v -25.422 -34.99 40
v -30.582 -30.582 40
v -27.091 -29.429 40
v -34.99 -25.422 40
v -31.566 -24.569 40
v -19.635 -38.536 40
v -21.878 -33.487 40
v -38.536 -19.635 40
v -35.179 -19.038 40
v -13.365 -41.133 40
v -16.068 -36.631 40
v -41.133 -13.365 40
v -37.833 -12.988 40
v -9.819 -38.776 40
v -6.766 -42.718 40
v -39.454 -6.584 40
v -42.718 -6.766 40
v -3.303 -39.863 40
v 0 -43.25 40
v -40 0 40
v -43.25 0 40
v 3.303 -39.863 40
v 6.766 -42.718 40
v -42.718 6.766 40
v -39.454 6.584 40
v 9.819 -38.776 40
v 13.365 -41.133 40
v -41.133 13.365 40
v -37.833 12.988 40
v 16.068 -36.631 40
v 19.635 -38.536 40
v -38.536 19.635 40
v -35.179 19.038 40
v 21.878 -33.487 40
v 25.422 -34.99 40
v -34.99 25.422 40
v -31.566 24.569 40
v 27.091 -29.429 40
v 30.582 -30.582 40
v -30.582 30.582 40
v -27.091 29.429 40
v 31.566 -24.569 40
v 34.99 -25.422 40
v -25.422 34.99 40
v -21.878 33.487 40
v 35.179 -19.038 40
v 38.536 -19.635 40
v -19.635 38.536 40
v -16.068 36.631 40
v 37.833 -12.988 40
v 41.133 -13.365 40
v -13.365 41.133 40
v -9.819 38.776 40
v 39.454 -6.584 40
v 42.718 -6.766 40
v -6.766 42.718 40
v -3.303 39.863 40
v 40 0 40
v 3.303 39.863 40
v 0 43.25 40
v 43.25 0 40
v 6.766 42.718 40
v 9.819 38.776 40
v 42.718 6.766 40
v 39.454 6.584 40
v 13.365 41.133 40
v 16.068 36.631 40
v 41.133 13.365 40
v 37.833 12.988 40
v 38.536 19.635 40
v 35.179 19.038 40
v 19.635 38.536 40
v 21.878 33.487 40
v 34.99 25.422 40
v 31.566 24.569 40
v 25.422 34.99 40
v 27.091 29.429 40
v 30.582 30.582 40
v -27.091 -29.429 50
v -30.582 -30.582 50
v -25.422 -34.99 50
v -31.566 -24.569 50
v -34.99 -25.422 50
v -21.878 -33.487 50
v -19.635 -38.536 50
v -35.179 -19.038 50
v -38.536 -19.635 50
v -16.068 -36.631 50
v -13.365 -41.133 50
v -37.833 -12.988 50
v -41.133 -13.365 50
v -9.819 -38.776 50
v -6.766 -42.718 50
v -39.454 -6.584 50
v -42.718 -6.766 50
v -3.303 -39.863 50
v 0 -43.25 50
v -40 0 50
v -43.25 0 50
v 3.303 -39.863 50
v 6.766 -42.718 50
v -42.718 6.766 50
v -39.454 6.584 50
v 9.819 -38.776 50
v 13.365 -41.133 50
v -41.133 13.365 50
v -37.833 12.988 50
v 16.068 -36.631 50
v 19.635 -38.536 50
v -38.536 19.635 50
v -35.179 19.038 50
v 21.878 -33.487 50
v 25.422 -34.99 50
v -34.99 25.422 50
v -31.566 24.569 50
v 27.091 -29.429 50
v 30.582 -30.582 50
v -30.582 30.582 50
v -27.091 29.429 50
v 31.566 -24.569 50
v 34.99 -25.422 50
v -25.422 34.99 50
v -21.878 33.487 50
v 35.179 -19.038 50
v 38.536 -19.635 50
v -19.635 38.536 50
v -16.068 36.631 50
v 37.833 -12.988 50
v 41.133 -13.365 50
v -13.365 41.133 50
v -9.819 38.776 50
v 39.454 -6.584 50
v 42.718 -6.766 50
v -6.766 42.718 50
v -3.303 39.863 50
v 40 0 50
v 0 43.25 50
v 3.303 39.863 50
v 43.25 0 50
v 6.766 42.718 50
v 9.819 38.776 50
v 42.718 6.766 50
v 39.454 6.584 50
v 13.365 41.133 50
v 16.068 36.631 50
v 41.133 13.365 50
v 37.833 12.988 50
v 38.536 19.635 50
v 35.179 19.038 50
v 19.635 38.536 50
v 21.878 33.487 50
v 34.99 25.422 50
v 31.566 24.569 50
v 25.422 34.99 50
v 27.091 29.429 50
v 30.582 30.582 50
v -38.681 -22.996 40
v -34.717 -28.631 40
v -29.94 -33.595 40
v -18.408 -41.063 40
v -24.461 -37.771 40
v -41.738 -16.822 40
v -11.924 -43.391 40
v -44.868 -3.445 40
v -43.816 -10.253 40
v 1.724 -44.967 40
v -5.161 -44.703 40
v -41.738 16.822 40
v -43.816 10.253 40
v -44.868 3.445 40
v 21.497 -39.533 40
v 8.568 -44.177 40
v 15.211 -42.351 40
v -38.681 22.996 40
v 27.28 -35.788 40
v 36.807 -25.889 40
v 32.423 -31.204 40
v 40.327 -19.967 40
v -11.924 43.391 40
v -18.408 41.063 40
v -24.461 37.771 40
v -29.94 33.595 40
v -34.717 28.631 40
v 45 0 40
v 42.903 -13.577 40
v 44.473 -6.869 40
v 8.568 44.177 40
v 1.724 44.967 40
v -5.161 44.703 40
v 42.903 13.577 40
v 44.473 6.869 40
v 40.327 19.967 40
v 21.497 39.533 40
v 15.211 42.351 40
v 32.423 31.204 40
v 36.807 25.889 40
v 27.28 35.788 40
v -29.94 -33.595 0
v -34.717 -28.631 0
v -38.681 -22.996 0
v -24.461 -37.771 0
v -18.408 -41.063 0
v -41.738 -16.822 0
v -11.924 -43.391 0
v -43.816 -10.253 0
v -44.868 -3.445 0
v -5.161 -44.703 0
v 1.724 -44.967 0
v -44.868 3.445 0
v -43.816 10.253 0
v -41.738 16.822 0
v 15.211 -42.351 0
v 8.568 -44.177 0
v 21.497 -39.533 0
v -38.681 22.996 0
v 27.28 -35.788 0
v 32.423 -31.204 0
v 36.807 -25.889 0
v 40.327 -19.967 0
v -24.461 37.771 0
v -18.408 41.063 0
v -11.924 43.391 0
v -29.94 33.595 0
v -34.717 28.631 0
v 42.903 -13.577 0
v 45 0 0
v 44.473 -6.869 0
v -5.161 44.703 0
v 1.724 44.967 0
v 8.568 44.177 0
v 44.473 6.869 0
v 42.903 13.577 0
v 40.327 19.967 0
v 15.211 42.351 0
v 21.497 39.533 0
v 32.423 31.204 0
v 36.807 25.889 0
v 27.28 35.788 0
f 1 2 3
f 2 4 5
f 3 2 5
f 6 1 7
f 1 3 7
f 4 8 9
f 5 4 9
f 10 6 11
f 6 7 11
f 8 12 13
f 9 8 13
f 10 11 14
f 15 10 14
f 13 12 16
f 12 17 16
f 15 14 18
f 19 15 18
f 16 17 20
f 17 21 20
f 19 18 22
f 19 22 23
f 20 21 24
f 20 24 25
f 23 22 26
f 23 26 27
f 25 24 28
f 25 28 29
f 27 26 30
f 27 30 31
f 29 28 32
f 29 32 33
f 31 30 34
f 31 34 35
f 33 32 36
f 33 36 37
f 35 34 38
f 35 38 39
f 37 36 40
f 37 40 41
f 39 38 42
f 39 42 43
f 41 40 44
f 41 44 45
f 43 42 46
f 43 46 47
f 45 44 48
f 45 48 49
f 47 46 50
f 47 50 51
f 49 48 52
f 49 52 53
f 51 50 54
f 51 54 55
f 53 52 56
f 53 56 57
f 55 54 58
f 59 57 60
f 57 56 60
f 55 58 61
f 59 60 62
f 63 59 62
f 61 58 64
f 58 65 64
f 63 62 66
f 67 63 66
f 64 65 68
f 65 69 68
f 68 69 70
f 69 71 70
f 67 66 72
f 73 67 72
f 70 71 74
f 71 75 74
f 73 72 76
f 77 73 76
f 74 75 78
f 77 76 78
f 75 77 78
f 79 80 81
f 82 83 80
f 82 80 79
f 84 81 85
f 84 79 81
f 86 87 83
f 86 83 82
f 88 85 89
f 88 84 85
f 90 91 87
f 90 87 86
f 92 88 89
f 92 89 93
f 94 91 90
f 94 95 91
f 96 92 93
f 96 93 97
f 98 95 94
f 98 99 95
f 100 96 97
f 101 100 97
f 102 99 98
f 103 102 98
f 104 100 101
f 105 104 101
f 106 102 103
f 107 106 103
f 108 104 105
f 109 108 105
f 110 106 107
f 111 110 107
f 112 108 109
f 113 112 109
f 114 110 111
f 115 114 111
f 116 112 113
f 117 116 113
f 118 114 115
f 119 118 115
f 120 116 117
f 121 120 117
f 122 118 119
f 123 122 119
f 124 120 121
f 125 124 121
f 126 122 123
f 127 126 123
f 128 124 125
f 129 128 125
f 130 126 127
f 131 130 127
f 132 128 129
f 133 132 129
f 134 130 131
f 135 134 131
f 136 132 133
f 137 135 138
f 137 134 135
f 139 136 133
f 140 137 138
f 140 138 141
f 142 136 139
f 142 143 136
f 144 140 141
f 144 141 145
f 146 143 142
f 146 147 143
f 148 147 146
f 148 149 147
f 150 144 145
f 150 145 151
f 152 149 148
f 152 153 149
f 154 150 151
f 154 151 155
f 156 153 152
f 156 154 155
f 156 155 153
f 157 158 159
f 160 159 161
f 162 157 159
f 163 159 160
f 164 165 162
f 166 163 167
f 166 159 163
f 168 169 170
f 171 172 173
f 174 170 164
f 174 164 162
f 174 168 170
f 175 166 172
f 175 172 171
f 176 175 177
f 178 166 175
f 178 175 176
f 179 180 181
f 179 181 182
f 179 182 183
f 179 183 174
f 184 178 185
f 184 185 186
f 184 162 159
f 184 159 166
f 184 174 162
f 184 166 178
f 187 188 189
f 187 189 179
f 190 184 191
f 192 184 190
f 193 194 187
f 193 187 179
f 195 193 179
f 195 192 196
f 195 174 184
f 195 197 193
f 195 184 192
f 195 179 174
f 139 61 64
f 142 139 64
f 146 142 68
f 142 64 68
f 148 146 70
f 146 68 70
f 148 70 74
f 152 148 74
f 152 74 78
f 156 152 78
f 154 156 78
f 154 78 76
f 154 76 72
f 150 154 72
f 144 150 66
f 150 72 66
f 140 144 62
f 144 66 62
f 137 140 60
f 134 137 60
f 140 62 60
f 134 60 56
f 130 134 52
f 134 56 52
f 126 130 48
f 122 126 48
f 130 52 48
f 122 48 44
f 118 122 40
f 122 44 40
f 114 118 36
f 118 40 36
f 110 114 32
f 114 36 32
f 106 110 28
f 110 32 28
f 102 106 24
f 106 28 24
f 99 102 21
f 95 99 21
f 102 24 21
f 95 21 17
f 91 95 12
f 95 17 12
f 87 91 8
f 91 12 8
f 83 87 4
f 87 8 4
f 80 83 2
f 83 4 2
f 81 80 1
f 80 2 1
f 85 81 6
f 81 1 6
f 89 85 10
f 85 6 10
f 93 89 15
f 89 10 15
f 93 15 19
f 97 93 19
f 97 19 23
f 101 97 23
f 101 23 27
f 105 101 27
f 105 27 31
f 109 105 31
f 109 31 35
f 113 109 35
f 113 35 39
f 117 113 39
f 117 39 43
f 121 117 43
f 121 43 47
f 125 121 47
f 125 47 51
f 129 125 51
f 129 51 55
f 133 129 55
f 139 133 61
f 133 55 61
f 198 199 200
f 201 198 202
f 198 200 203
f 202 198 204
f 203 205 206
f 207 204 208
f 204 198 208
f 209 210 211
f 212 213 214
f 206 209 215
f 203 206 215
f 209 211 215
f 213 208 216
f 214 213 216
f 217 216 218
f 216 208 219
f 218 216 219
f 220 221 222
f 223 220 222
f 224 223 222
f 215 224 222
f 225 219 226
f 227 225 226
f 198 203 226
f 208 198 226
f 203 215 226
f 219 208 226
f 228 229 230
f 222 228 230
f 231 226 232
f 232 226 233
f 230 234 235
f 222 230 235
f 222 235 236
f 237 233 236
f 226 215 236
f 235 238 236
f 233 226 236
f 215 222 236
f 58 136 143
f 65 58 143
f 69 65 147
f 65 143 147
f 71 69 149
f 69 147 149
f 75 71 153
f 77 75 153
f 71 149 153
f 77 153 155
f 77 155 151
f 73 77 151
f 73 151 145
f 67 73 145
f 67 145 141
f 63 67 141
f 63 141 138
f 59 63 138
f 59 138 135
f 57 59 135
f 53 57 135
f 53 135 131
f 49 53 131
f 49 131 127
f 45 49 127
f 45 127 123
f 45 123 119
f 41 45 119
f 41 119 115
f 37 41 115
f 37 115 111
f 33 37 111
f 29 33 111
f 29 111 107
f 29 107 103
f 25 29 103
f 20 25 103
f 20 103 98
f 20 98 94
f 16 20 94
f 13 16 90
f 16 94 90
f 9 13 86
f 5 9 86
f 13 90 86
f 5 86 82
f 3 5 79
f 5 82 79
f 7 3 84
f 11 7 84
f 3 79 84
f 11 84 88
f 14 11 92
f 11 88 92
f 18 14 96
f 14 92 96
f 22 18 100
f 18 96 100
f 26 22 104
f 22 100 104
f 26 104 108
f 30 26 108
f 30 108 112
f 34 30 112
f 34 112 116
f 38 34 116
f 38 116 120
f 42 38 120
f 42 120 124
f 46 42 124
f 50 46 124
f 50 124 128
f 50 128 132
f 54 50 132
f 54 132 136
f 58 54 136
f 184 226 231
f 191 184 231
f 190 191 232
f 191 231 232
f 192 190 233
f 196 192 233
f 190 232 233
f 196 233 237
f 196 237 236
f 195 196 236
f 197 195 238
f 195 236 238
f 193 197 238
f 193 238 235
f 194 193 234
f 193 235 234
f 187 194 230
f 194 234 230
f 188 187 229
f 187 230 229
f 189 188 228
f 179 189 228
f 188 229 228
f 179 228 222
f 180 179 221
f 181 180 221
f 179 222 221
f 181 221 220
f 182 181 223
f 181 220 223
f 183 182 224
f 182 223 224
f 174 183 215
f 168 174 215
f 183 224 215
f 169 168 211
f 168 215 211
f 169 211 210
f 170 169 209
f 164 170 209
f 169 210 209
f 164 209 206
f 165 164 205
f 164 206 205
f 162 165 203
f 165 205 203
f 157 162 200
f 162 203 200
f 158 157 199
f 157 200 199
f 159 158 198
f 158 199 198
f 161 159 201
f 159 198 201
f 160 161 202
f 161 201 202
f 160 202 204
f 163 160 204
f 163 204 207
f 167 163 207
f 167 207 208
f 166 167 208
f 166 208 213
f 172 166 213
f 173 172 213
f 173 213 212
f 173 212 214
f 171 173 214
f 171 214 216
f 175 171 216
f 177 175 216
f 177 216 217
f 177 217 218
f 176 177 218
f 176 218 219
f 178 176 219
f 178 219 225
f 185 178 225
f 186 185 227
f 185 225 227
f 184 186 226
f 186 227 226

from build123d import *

# Parameters (mm, degrees)
F0_R     = 45
F1_DEPTH = 40
F2_R     = 43.25
F3_DEPTH = 10
F4_R     = 40
F5_DEPTH = 40


with BuildPart() as f1:
    # F0 (on Top) → F1 (new body)
    with BuildSketch(Plane.XY):
        Circle(F0_R)
    extrude(amount=F1_DEPTH)


with BuildPart() as f3:
    # F2 (on face) → F3 (new body)
    with BuildSketch(Plane.XY.offset(40)):
        Circle(F2_R)
    extrude(amount=F3_DEPTH)

    # F4 (on face) → F5 (cut)
    with BuildSketch(Plane.XY.offset(50)):
        Circle(F4_R)
    extrude(amount=-F5_DEPTH, mode=Mode.SUBTRACT)


solid = Compound([f1.part, f3.part])
